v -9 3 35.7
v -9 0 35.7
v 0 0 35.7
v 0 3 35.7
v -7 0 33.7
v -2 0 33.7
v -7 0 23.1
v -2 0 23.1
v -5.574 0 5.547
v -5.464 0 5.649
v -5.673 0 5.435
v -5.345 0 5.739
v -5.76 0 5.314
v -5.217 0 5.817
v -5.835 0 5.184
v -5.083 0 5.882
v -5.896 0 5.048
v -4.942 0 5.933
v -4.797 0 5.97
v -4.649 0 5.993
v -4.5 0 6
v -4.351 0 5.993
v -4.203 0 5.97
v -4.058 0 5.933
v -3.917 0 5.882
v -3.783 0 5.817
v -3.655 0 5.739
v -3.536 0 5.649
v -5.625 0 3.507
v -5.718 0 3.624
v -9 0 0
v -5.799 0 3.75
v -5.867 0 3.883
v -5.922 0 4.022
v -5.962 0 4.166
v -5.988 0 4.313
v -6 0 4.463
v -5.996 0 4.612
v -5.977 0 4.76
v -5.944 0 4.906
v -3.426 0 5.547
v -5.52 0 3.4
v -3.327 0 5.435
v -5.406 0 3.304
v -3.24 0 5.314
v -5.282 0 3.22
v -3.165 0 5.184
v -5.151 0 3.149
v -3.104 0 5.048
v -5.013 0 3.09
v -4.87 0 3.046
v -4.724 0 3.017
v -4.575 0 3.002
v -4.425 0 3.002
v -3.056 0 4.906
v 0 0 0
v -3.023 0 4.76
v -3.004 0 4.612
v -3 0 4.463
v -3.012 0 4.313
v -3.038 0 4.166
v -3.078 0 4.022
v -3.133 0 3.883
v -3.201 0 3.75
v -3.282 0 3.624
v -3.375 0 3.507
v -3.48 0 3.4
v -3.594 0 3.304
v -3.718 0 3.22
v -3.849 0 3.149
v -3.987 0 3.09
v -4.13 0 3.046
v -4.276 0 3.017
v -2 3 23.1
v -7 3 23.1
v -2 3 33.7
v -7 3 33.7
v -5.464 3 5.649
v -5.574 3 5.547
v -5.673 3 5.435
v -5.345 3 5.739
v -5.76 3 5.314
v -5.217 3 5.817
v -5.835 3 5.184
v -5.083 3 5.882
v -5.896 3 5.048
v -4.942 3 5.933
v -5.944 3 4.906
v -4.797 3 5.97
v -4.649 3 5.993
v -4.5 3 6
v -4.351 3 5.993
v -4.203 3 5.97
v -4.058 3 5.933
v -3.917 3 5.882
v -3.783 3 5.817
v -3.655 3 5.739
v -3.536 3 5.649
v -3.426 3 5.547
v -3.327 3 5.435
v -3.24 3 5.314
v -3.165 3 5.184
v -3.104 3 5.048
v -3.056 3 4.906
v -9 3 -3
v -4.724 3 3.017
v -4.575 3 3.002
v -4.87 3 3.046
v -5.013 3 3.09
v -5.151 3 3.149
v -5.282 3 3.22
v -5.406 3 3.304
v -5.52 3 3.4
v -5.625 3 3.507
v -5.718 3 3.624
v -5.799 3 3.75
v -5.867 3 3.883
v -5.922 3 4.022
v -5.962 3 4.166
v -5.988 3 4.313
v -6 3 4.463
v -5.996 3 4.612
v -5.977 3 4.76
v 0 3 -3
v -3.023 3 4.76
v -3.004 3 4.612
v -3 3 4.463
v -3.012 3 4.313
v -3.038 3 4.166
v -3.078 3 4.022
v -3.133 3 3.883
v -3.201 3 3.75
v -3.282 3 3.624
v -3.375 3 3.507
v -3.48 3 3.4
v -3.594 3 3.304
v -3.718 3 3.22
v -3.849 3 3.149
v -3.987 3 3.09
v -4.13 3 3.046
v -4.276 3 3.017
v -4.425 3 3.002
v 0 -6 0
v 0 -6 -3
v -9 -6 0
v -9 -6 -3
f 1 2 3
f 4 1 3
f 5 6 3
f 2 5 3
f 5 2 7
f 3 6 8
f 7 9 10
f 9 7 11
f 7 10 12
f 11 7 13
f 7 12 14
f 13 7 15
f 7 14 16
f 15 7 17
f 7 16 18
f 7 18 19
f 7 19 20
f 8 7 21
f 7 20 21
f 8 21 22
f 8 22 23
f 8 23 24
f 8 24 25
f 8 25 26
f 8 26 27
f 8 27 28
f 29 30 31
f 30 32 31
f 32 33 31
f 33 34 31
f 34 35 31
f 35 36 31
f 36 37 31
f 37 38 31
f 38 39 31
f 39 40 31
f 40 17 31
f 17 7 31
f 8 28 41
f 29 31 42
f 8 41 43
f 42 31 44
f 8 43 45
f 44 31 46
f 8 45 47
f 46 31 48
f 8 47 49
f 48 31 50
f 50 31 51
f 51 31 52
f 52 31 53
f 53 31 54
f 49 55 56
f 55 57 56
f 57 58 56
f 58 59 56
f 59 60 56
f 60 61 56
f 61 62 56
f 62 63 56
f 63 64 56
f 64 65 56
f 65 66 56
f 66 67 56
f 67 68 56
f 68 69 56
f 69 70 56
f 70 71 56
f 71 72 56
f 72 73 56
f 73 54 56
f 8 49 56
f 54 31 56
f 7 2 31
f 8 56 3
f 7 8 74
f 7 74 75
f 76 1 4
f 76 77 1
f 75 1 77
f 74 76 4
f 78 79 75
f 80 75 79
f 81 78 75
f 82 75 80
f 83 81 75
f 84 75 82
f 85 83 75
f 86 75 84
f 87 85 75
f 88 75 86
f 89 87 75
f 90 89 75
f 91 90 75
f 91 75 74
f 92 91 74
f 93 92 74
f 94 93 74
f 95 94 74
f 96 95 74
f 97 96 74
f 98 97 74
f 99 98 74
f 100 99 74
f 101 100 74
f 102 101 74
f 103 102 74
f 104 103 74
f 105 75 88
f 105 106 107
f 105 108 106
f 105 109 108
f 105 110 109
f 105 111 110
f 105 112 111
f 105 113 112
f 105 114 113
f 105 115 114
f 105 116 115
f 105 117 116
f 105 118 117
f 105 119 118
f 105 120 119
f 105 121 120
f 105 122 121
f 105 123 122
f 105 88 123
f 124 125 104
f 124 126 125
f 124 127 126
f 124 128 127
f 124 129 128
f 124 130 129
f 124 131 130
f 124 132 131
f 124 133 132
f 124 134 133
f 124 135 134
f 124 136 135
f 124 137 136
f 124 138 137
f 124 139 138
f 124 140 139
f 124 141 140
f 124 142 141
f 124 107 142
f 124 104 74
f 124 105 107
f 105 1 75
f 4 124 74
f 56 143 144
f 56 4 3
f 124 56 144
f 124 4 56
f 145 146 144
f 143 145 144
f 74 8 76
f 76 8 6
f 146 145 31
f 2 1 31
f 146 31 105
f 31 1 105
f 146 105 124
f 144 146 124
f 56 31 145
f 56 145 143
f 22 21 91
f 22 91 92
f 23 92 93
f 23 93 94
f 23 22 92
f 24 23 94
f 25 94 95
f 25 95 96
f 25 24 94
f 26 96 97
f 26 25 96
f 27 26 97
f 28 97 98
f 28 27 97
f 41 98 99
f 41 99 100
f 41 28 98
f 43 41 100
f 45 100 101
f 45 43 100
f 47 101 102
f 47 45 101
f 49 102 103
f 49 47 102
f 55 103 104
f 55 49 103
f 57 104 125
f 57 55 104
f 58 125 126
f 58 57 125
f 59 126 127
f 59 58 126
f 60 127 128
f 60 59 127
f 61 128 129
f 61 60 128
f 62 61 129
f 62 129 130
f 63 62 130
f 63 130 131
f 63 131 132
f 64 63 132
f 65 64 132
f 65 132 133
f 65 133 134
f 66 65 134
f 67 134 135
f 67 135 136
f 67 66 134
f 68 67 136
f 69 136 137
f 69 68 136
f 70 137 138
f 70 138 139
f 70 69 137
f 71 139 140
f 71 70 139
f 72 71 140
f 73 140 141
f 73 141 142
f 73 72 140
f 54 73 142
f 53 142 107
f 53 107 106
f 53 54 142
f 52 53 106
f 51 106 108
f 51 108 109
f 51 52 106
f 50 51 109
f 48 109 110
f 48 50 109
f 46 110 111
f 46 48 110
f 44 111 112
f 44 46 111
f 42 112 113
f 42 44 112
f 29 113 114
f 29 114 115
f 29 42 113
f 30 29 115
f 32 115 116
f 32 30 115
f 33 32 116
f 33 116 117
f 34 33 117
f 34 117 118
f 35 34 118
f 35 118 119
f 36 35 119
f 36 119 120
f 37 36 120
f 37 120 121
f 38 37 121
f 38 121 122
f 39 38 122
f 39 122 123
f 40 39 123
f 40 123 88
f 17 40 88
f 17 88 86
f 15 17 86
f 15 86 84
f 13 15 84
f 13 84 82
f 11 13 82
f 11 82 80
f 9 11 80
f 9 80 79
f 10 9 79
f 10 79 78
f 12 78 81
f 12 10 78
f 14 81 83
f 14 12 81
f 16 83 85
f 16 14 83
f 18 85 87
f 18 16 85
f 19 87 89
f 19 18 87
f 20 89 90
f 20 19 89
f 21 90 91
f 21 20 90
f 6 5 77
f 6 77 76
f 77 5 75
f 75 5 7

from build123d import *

# Parameters (mm, degrees)
SKETCH1_W           = 9
SKETCH1_H           = 35.7
SKETCH1_R           = 1.5
BOSS_EXTRUDE1_DEPTH = 3
SKETCH2_W           = 9
SKETCH2_H           = 3
BOSS_EXTRUDE2_DEPTH = 9


with BuildPart() as part:
    # Sketch1 → Boss-Extrude1 (new body)
    with BuildSketch(Plane(origin=(0, 0, 0), x_dir=(1, 0, 0), z_dir=(0, 1, 0))):
        with Locations((-4.5, -17.85)):
            Rectangle(SKETCH1_W, SKETCH1_H)
        with Locations(Location((-4.5, -4.5, 0), (0, 0, 270))):
            Circle(SKETCH1_R, mode=Mode.SUBTRACT)
        Polygon((-7, -32.7), (-7, -33.7), (-2, -33.7), (-2, -32.7), (-2, -23.1), (-7, -23.1), align=None, mode=Mode.SUBTRACT)
    extrude(amount=BOSS_EXTRUDE1_DEPTH)

    # Sketch2 → Boss-Extrude2 (add)
    with BuildSketch(Plane(origin=(0, 3, 0), x_dir=(1, 0, 0), z_dir=(0, 1, 0))):
        with Locations((-4.5, 1.5)):
            Rectangle(SKETCH2_W, SKETCH2_H)
    extrude(amount=-BOSS_EXTRUDE2_DEPTH)


solid = part.part
